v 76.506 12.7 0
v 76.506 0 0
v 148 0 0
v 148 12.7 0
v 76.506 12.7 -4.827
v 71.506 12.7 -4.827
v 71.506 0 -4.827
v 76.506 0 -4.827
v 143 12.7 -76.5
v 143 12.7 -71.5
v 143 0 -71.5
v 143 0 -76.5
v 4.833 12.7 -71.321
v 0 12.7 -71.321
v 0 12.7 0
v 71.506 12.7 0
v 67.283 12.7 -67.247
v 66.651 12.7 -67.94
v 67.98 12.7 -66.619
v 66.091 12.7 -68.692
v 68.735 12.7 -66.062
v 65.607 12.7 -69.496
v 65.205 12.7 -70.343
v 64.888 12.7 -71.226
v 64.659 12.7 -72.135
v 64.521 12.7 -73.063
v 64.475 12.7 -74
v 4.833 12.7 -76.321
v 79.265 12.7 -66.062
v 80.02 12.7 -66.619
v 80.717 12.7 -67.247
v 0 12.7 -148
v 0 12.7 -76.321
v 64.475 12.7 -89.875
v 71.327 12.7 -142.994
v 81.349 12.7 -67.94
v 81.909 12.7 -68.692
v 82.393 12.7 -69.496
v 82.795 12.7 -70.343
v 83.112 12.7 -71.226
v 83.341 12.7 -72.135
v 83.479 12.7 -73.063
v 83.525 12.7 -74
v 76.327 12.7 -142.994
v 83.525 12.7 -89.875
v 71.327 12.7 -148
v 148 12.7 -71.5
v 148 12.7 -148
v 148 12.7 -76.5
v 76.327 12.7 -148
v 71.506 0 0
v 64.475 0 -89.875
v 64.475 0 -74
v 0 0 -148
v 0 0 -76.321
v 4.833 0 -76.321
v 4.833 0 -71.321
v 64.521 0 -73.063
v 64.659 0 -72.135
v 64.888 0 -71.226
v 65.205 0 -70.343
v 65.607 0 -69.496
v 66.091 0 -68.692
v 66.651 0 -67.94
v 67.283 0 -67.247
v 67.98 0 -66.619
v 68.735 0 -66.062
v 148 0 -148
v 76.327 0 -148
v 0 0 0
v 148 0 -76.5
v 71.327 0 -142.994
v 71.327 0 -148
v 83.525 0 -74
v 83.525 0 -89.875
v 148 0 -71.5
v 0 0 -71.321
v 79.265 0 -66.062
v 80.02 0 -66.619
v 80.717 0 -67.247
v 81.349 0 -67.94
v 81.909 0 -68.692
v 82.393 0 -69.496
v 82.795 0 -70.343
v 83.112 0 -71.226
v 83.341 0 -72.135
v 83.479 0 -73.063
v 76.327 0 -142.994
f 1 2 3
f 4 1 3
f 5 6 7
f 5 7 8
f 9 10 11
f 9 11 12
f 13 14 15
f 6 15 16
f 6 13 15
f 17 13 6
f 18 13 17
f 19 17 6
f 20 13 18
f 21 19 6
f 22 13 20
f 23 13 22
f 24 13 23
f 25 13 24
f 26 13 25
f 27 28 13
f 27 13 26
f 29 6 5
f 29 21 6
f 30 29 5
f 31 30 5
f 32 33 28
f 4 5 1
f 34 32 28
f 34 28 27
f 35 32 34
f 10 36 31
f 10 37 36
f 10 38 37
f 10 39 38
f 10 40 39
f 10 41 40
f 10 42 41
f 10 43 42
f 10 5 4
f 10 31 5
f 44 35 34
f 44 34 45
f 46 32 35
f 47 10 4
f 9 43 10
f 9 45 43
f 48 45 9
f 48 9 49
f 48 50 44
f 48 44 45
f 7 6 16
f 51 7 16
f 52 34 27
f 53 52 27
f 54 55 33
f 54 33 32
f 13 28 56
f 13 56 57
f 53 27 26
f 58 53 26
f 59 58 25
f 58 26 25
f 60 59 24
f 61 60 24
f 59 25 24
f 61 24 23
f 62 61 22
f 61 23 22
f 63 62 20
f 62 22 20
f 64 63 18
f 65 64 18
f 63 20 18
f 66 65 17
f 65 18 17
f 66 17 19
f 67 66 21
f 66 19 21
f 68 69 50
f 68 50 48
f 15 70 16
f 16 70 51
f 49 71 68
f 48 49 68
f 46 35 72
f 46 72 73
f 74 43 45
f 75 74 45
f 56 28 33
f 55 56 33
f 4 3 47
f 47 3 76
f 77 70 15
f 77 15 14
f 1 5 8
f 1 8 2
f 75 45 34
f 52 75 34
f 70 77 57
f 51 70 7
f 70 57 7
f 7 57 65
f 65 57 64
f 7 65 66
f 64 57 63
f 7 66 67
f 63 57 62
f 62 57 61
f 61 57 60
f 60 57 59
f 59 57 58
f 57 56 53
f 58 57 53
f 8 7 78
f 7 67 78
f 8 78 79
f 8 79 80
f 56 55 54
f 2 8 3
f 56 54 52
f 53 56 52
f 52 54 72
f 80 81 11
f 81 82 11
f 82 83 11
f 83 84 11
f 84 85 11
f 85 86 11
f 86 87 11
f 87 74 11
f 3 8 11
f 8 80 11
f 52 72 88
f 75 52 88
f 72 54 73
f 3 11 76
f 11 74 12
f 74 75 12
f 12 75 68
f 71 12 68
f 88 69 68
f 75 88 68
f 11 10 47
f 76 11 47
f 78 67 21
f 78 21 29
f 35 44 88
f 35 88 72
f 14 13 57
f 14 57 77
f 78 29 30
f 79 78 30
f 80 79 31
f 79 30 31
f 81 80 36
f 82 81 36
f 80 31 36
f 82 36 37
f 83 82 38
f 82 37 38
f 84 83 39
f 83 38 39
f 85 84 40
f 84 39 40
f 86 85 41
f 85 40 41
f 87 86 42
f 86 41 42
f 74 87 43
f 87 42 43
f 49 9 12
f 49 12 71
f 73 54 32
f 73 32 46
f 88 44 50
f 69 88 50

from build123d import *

# Parameters (mm, degrees)
SKETCH1_W           = 148
SKETCH1_H           = 148
BOSS_EXTRUDE1_DEPTH = 12.7
SKETCH2_W           = 10.53028371
SKETCH2_H           = 7.9375
CUT_EXTRUDE1_DEPTH  = 12.7
SKETCH4_W           = 10
SKETCH4_H           = 5
CUT_EXTRUDE2_DEPTH  = 210.688554766
CIRPATTERN1_COUNT   = 4


with BuildPart() as part:
    # Sketch1 → Boss-Extrude1 (new body)
    with BuildSketch(Plane(origin=(0, 0, 0), x_dir=(1, 0, 0), z_dir=(0, 1, 0))):
        with Locations((74, 74)):
            Rectangle(SKETCH1_W, SKETCH1_H)
    extrude(amount=BOSS_EXTRUDE1_DEPTH)

    # Sketch2 → Cut-Extrude1 (cut)
    with BuildSketch(Plane(origin=(0, 12.7, 0), x_dir=(1, 0, 0), z_dir=(0, 1, 0))):
        with BuildLine():
            ThreePointArc((79.265141855, 81.9375), (82.392737967, 78.504173), (83.525, 74))
            Line((83.525, 74), (83.525, 89.875))
            Line((83.525, 89.875), (64.475, 89.875))
            Line((64.475, 89.875), (64.475, 74))
            ThreePointArc((64.475, 74), (65.607262033, 78.504173), (68.734858145, 81.9375))
            ThreePointArc((68.734858145, 81.9375), (74, 83.525), (79.265141855, 81.9375))
        make_face()
        with BuildLine():
            ThreePointArc((79.265141855, 66.0625), (82.392737967, 69.495827), (83.525, 74))
            Line((83.525, 74), (79.265141855, 74))
            Line((79.265141855, 74), (79.265141855, 66.0625))
        make_face()
        with BuildLine():
            Line((79.265141855, 74), (83.525, 74))
            ThreePointArc((83.525, 74), (82.392737967, 78.504173), (79.265141855, 81.9375))
            Line((79.265141855, 81.9375), (79.265141855, 74))
        make_face()
        with BuildLine():
            Line((68.734858145, 66.0625), (68.734858145, 74))
            Line((68.734858145, 74), (64.475, 74))
            ThreePointArc((64.475, 74), (65.607262033, 69.495827), (68.734858145, 66.0625))
        make_face()
        with BuildLine():
            Line((64.475, 74), (68.734858145, 74))
            Line((68.734858145, 74), (68.734858145, 81.9375))
            ThreePointArc((68.734858145, 81.9375), (65.607262033, 78.504173), (64.475, 74))
        make_face()
        with Locations((74, 77.96875)):
            Rectangle(SKETCH2_W, SKETCH2_H)
        with BuildLine():
            Line((68.734858145, 81.9375), (79.265141855, 81.9375))
            ThreePointArc((79.265141855, 81.9375), (74, 83.525), (68.734858145, 81.9375))
        make_face()
        with BuildLine():
            ThreePointArc((79.265141855, 66.0625), (82.392737967, 69.495827), (83.525, 74))
            Line((83.525, 74), (79.265141855, 74))
            Line((79.265141855, 74), (79.265141855, 66.0625))
        make_face()
        with BuildLine():
            Line((79.265141855, 74), (83.525, 74))
            ThreePointArc((83.525, 74), (82.392737967, 78.504173), (79.265141855, 81.9375))
            Line((79.265141855, 81.9375), (79.265141855, 74))
        make_face()
        with BuildLine():
            Line((68.734858145, 66.0625), (68.734858145, 74))
            Line((68.734858145, 74), (64.475, 74))
            ThreePointArc((64.475, 74), (65.607262033, 69.495827), (68.734858145, 66.0625))
        make_face()
        with BuildLine():
            Line((64.475, 74), (68.734858145, 74))
            Line((68.734858145, 74), (68.734858145, 81.9375))
            ThreePointArc((68.734858145, 81.9375), (65.607262033, 78.504173), (64.475, 74))
        make_face()
        with Locations((74, 70.03125)):
            Rectangle(SKETCH2_W, SKETCH2_H)
    extrude(amount=-CUT_EXTRUDE1_DEPTH, mode=Mode.SUBTRACT)

    # Sketch4 → Cut-Extrude2 (cut, through all)
    with BuildSketch(Plane(origin=(0, 12.7, 0), x_dir=(1, 0, 0), z_dir=(0, 1, 0))):
        with Locations((148, 74)):
            Rectangle(SKETCH4_W, SKETCH4_H)
    cut_extrude2 = extrude(amount=-CUT_EXTRUDE2_DEPTH, mode=Mode.SUBTRACT)

    # CirPattern1: Cut-Extrude2 ×4 about axis
    cirpattern1_axis = Axis((73.916648848, 12.7, -73.910393573), (0, 1, 0))
    for i in range(1, CIRPATTERN1_COUNT):
        add(cut_extrude2.rotate(cirpattern1_axis, i * 360 / CIRPATTERN1_COUNT), mode=Mode.SUBTRACT)


solid = part.part
